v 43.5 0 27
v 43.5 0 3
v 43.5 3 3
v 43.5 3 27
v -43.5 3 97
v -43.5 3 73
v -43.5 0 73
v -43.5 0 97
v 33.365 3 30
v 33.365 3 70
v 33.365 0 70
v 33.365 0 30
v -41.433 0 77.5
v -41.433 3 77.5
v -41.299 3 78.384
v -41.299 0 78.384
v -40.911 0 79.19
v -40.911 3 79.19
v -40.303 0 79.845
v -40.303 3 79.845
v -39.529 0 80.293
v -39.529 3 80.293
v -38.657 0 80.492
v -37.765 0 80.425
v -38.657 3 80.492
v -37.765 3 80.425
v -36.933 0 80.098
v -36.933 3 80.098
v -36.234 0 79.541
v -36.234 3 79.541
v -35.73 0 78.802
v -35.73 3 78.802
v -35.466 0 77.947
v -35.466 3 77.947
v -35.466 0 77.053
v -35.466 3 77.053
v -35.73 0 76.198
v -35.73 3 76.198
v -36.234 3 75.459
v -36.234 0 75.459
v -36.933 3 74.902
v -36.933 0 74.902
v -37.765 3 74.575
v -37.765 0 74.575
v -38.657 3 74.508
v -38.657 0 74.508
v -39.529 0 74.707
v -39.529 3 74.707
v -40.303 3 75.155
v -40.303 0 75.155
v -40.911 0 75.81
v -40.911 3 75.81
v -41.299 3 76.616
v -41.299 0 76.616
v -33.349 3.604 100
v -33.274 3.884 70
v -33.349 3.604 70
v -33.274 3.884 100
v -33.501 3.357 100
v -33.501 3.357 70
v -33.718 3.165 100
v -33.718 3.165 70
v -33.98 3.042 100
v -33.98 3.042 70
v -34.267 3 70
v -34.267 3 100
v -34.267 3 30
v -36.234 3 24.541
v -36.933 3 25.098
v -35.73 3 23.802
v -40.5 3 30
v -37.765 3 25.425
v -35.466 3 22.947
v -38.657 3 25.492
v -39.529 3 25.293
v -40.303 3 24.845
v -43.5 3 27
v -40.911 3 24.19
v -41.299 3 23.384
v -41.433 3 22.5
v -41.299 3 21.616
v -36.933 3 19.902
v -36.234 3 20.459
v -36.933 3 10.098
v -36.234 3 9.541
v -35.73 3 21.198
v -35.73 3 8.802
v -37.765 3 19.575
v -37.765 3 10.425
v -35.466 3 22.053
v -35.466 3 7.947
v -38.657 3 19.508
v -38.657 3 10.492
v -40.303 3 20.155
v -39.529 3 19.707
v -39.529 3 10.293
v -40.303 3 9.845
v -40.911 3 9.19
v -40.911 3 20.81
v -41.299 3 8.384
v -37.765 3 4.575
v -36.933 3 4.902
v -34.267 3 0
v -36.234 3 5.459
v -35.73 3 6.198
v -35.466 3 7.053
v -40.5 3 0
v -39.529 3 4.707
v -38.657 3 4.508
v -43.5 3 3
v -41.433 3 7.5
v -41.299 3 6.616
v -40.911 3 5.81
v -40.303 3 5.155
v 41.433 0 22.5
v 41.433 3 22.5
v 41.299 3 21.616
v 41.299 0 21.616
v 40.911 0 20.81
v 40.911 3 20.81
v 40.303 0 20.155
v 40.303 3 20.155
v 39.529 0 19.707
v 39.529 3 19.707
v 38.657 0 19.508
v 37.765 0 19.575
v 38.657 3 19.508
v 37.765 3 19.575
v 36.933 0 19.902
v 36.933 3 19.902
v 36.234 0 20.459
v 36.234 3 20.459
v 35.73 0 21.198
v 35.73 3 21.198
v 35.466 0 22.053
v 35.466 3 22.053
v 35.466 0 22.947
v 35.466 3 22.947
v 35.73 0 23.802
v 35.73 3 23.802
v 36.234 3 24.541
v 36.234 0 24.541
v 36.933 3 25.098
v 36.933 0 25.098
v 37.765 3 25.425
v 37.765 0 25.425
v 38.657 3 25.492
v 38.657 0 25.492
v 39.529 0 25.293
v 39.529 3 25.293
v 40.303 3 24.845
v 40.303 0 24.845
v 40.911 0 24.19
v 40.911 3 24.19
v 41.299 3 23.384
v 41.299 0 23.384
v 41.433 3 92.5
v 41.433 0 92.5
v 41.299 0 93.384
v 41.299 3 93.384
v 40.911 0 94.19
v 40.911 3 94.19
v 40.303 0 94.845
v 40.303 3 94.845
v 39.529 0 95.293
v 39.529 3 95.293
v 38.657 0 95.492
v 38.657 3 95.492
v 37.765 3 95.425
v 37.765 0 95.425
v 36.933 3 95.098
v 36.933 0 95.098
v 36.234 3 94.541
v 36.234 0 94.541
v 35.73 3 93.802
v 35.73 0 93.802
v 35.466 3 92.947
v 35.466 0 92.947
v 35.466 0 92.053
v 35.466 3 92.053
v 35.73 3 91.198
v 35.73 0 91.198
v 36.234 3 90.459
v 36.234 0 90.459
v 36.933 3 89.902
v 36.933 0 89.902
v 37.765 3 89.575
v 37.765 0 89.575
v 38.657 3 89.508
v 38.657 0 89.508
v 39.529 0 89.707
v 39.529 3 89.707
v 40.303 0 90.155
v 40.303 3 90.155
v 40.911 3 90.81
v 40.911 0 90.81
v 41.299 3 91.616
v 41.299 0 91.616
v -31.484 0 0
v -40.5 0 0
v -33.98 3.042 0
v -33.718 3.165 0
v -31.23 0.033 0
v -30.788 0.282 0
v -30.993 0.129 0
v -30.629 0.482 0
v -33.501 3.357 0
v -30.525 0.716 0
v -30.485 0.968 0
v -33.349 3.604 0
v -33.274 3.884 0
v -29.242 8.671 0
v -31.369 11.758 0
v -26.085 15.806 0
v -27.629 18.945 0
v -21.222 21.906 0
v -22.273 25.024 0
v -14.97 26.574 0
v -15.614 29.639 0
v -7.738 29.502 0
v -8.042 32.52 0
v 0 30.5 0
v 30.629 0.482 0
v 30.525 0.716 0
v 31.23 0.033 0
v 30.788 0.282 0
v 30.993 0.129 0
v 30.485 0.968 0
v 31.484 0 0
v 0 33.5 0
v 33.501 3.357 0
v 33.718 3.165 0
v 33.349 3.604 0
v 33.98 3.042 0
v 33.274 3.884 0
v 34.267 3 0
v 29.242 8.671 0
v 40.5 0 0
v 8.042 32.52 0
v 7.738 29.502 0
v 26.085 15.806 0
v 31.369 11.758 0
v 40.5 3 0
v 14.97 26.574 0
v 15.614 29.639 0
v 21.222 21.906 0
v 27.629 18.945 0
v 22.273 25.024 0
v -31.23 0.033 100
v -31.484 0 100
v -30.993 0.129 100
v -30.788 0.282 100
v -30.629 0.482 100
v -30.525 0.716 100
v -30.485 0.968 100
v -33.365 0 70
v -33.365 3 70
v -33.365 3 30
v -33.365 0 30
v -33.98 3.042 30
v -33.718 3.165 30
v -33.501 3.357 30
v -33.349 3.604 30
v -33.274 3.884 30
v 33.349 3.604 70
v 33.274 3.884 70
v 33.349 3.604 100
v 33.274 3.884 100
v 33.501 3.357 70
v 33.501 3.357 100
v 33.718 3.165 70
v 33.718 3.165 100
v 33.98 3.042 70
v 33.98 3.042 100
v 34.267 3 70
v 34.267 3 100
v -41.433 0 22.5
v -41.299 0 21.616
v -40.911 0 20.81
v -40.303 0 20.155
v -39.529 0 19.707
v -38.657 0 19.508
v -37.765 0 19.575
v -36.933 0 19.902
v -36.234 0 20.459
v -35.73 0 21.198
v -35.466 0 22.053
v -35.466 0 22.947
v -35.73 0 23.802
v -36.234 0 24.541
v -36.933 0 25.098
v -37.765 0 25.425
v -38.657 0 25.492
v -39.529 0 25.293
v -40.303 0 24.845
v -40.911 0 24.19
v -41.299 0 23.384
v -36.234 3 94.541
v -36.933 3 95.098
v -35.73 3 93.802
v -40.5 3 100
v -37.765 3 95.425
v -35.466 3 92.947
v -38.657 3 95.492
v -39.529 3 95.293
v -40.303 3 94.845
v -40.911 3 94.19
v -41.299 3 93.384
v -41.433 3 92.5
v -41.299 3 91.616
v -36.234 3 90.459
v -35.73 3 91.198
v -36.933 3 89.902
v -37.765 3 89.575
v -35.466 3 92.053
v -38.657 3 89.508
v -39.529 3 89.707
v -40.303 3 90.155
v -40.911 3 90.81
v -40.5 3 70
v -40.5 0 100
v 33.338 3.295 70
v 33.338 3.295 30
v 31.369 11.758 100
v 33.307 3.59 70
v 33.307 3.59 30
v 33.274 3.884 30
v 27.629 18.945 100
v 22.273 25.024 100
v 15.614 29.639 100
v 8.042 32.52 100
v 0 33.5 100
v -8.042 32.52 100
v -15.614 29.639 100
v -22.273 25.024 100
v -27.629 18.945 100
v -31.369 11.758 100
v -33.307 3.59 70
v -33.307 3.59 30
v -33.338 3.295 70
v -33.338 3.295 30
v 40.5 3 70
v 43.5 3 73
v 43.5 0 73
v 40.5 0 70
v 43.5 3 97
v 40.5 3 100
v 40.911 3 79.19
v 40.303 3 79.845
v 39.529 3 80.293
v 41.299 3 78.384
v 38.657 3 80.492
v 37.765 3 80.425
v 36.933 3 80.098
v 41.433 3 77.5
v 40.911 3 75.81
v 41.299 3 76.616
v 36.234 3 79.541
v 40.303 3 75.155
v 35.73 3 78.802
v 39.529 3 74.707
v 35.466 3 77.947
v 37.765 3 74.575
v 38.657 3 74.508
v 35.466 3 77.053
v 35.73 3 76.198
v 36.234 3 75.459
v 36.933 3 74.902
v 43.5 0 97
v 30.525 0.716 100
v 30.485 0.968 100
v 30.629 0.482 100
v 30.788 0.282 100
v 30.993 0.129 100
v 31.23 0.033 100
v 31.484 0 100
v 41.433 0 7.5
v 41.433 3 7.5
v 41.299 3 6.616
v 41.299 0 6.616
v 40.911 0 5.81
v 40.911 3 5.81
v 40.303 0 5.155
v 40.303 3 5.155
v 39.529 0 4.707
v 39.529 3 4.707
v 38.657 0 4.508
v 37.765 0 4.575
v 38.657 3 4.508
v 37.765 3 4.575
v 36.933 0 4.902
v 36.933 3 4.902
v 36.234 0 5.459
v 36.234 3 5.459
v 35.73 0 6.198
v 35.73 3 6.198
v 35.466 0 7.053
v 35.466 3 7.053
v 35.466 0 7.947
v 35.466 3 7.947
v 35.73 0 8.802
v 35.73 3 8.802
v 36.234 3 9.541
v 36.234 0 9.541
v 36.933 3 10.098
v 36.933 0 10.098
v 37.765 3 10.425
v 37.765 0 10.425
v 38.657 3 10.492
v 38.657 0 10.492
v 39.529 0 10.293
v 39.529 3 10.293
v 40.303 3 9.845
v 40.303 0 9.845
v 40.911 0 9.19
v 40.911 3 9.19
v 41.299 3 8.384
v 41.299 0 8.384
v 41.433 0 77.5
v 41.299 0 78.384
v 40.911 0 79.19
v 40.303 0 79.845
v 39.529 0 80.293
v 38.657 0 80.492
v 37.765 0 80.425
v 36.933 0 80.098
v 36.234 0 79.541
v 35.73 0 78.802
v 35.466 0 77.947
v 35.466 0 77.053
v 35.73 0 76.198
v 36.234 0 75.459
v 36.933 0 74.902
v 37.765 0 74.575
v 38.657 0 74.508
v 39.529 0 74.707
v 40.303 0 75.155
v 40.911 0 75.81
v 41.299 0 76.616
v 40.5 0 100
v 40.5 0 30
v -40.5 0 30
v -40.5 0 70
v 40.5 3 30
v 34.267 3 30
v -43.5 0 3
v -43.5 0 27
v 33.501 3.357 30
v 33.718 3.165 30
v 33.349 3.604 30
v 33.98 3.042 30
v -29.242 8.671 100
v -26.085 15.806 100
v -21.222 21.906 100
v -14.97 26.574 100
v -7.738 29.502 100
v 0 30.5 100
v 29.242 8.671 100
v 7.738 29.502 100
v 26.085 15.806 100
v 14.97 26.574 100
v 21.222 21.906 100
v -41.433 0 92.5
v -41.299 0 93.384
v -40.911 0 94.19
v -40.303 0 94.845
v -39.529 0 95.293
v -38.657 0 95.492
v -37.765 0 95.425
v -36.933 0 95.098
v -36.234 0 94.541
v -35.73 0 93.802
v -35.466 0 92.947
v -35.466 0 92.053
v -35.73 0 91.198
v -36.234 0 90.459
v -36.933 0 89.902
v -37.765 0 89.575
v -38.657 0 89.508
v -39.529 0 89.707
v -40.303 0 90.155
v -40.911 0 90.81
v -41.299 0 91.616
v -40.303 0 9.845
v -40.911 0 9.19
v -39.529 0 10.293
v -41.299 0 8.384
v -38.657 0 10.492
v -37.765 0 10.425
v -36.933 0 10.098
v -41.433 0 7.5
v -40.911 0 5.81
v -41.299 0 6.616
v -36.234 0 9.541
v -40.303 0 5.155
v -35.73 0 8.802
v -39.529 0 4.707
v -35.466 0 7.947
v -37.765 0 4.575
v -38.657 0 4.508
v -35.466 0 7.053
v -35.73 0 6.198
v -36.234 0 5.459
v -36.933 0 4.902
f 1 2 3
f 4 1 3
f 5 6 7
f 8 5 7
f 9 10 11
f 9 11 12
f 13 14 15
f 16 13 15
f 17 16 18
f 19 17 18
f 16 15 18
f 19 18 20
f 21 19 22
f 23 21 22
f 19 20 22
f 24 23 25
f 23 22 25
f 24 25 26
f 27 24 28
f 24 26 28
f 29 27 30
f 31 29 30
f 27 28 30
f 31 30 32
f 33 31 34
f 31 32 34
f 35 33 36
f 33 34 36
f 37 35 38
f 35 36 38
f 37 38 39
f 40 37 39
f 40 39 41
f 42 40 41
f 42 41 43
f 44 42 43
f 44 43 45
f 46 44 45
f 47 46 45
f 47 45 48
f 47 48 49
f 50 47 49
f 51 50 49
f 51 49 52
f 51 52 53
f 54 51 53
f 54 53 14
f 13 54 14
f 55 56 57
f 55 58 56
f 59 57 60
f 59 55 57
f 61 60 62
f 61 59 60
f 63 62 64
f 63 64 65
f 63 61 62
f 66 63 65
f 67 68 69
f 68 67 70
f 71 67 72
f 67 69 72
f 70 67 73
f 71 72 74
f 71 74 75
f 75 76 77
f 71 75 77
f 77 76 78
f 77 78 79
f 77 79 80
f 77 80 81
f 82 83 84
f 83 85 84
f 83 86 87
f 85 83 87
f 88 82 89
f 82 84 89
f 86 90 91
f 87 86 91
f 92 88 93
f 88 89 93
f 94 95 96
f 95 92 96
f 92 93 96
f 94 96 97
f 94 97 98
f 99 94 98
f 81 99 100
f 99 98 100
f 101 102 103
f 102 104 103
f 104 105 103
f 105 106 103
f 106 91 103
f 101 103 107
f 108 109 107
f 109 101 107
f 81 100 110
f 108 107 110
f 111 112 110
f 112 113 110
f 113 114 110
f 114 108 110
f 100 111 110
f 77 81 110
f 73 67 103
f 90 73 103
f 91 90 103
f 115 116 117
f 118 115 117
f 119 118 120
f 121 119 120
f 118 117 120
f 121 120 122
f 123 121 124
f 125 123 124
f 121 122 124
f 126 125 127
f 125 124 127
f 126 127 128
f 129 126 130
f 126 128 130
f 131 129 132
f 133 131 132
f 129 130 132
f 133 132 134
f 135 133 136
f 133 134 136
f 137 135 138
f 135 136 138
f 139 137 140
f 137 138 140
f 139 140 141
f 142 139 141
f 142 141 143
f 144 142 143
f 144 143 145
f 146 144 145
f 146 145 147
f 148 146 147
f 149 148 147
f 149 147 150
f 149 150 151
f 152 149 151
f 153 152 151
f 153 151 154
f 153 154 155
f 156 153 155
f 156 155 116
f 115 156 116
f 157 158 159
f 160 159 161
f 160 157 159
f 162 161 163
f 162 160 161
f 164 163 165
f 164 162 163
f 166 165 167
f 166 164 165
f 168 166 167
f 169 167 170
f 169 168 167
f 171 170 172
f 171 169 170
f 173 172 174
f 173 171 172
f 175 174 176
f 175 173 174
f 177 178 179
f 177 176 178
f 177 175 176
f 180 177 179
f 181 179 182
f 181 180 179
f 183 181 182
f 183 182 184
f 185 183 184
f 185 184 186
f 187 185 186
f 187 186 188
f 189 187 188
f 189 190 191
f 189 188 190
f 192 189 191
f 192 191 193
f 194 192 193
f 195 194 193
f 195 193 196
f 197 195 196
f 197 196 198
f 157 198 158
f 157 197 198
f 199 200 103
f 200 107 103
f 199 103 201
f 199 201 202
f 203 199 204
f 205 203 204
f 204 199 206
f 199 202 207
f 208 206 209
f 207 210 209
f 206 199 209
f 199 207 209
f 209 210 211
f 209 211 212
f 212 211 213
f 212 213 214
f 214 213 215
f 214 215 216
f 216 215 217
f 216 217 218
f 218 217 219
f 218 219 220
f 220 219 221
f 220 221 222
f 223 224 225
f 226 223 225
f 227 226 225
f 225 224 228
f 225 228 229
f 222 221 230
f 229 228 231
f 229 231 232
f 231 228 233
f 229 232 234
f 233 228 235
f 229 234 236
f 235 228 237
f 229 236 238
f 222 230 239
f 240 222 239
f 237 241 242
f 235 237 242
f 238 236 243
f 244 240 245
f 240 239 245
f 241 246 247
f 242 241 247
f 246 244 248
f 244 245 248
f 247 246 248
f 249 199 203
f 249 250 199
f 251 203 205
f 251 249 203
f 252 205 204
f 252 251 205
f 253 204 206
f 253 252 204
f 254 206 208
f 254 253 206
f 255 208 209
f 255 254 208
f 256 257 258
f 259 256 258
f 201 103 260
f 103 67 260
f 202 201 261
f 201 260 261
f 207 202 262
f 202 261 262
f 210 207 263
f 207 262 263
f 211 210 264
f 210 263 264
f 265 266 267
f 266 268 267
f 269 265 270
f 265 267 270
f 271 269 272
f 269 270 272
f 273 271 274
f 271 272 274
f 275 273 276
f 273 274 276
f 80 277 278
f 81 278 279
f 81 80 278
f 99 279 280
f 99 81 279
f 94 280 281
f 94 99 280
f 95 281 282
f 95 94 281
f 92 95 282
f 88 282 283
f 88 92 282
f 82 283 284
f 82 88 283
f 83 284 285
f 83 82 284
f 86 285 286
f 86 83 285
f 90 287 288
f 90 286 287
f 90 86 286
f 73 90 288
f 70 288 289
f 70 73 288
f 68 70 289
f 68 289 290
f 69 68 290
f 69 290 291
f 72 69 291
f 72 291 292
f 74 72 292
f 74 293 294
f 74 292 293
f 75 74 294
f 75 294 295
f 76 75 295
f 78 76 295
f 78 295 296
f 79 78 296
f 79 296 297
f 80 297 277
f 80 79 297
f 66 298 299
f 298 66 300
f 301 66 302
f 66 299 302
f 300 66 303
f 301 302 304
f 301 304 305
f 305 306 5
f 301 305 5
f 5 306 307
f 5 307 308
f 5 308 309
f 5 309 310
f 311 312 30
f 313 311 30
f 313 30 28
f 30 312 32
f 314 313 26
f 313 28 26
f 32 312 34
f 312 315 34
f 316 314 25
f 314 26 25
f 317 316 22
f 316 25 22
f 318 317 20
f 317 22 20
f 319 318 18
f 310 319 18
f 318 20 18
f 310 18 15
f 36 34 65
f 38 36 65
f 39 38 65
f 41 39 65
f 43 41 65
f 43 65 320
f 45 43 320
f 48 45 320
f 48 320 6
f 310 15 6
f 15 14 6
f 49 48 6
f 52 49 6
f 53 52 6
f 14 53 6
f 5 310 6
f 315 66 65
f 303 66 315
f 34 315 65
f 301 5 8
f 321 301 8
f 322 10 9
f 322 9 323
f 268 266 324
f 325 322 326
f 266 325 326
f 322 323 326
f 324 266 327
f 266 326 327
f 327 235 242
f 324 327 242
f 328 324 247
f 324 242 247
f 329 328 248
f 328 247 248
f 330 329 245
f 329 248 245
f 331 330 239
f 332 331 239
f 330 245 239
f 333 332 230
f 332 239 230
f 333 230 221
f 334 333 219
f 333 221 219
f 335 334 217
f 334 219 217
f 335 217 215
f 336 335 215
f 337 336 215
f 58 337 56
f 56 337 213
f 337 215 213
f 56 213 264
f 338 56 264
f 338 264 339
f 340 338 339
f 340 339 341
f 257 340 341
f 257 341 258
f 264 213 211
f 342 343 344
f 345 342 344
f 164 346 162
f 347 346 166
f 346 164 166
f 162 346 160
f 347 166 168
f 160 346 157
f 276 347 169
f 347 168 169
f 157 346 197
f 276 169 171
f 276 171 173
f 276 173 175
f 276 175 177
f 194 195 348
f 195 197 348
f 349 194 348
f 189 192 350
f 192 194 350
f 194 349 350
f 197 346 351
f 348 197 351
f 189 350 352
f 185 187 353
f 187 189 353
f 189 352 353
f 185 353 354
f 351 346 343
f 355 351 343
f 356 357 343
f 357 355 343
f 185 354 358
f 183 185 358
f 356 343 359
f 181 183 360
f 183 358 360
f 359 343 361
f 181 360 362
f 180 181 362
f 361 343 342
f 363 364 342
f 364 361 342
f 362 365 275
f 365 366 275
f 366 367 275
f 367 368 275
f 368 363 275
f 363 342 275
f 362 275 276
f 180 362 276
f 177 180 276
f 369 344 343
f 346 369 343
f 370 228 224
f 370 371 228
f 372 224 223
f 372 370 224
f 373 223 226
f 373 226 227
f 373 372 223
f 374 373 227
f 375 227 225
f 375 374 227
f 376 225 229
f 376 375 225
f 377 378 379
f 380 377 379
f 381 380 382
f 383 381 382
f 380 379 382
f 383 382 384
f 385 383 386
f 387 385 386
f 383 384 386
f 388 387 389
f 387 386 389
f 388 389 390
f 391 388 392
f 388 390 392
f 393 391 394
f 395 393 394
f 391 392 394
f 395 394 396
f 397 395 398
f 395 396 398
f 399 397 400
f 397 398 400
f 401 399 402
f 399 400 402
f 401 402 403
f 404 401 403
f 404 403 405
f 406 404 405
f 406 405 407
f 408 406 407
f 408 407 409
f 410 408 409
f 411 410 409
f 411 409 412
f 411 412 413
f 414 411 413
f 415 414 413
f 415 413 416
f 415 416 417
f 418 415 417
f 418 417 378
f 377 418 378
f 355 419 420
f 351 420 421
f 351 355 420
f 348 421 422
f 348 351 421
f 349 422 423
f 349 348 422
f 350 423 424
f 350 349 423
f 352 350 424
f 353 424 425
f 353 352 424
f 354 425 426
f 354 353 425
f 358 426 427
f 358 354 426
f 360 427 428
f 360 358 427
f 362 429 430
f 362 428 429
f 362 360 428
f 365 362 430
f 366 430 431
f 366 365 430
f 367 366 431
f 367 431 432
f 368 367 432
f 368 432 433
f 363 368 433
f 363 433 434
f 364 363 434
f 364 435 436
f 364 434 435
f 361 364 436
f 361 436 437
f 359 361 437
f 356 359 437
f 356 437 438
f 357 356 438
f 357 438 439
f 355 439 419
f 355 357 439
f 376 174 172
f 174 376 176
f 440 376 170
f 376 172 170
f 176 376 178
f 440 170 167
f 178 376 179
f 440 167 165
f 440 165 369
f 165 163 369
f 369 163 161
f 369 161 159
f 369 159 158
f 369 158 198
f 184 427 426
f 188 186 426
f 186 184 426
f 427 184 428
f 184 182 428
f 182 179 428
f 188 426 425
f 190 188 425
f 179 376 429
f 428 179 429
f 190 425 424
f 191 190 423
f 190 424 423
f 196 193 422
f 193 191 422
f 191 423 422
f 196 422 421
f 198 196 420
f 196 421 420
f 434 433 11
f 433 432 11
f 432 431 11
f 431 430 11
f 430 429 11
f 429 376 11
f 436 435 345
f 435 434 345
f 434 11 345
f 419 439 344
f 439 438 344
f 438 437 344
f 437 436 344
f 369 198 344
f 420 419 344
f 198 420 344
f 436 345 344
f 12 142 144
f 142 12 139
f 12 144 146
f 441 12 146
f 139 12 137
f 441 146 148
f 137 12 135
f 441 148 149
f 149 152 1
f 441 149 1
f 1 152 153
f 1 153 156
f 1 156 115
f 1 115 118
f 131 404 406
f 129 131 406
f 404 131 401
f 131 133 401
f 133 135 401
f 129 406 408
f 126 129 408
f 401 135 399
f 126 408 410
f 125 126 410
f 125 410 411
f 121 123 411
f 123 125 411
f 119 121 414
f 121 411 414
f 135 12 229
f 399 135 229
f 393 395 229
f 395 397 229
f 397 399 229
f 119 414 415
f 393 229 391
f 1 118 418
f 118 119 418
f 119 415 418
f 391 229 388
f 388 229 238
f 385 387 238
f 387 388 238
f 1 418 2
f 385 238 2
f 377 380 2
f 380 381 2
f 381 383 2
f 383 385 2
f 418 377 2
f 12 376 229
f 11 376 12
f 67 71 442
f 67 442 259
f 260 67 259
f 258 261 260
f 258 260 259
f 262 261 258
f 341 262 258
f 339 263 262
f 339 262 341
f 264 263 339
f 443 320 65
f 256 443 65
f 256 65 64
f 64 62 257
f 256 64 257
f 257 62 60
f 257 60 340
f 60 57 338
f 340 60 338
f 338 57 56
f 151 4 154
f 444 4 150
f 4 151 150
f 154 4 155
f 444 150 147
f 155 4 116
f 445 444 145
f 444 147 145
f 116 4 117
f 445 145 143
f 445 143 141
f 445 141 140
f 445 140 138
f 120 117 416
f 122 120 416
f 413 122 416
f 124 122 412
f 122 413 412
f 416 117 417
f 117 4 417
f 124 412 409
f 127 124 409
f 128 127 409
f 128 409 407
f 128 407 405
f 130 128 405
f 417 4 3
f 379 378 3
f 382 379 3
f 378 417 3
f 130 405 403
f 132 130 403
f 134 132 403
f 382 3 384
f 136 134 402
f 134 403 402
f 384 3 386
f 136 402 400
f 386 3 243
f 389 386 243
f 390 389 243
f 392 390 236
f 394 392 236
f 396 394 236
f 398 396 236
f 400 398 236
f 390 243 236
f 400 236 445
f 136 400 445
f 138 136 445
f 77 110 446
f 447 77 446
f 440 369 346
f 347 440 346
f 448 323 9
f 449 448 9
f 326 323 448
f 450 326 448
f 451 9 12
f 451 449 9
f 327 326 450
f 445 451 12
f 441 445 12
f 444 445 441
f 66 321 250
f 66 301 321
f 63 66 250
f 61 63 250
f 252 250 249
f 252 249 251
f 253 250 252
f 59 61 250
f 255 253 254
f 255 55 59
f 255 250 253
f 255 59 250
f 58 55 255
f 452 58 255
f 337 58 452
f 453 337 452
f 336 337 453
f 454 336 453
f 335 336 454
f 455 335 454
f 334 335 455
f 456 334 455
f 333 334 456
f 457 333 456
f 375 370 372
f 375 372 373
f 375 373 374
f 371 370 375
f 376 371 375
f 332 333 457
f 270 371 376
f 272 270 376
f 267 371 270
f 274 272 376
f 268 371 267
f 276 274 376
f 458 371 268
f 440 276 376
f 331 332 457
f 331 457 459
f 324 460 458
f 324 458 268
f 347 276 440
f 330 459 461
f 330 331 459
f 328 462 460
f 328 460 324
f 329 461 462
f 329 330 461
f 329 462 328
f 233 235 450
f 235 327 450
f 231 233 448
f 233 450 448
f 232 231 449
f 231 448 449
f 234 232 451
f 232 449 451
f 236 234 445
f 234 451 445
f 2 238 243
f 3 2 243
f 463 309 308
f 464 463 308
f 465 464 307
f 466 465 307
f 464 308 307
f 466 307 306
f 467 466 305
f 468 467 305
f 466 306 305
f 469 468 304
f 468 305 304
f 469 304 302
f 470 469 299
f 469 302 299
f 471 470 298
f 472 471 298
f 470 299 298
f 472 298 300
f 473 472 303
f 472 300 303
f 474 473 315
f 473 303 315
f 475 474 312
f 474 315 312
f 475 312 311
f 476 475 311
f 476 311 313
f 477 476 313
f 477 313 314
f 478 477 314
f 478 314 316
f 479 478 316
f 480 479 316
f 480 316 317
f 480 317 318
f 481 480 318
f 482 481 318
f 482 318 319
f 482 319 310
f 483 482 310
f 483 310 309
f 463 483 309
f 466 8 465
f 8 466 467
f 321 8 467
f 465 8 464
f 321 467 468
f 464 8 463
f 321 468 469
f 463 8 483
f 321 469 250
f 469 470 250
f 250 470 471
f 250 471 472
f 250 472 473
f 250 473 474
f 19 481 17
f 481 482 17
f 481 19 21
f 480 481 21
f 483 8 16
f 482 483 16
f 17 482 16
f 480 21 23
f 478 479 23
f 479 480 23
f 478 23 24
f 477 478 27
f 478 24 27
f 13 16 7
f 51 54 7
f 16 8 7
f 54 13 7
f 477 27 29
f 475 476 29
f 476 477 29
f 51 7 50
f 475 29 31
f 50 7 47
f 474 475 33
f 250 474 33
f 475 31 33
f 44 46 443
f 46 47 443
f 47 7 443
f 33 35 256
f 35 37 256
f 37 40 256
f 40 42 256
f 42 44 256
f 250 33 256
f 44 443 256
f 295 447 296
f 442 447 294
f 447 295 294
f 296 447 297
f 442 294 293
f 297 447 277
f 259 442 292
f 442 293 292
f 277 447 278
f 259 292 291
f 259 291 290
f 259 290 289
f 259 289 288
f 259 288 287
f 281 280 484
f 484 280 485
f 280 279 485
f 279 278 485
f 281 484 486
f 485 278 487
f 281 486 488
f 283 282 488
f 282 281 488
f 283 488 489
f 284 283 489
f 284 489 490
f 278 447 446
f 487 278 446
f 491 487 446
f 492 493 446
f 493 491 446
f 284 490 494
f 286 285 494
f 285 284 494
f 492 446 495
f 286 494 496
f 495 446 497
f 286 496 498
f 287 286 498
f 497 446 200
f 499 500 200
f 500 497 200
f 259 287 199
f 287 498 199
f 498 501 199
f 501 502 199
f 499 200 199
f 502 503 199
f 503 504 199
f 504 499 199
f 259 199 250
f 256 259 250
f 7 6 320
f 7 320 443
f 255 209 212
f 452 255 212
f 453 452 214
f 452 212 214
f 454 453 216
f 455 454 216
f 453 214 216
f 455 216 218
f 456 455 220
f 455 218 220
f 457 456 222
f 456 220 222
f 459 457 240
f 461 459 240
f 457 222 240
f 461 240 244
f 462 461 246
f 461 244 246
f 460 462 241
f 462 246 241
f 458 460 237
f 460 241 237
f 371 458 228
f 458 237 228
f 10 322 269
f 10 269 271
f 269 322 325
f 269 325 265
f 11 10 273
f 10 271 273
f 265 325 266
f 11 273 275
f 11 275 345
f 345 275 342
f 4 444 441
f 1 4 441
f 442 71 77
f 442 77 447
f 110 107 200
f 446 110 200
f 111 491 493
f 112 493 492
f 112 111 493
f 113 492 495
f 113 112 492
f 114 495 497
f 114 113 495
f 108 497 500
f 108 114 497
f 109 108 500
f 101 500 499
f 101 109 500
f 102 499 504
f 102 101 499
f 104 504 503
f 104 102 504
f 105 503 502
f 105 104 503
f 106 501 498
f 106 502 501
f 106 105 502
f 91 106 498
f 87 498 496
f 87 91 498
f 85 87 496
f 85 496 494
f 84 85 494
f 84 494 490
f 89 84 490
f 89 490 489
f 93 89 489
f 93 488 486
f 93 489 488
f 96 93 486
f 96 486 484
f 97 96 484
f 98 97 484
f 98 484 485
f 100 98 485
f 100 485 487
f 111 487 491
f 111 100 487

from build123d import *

# Parameters (mm, degrees)
BOSS_EXTRUDE1_DEPTH     = 100
SKETCH3_W               = 10.134598759
SKETCH3_H               = 40
CUT_EXTRUDE1_DEPTH      = 60
SKETCH4_R               = 3
CUT_EXTRUDE2_DEPTH      = 60
MIRROR4_COPY_1_SKETCH_R = 3
MIRROR4_COPY_1_DEPTH    = 60
CHAMFER1_SIZE           = 3
FILLET1_R               = 1


with BuildPart() as part:
    # Sketch1 → Boss-Extrude1 (new body)
    with BuildSketch(Plane.XY):
        with BuildLine():
            Line((-43.5, 0), (-33.5, 0))
            ThreePointArc((-33.5, 0), (-33.466333393, 1.501508976), (-33.365401241, 3))
            Line((-33.365401241, 3), (-43.5, 3))
            Line((-43.5, 3), (-43.5, 0))
        make_face()
        with BuildLine():
            Line((-33.5, 0), (-30.5, 0))
            ThreePointArc((-30.5, 0), (0, 30.5), (30.5, 0))
            Line((30.5, 0), (33.5, 0))
            ThreePointArc((33.5, 0), (33.466333393, 1.501508976), (33.365401241, 3))
            ThreePointArc((33.365401241, 3), (0, 33.5), (-33.365401241, 3))
            ThreePointArc((-33.365401241, 3), (-33.466333393, 1.501508976), (-33.5, 0))
        make_face()
        with BuildLine():
            ThreePointArc((33.365401241, 3), (33.466333393, 1.501508976), (33.5, 0))
            Line((33.5, 0), (43.5, 0))
            Line((43.5, 0), (43.5, 3))
            Line((43.5, 3), (33.365401241, 3))
        make_face()
    extrude(amount=BOSS_EXTRUDE1_DEPTH)

    # Sketch3 → Cut-Extrude1 (cut)
    with BuildSketch(Plane(origin=(0, 3, 0), x_dir=(1, 0, 0), z_dir=(0, 1, 0))):
        with Locations((38.432700621, -50)):
            Rectangle(SKETCH3_W, SKETCH3_H)
        with Locations((-38.432700621, -50)):
            Rectangle(SKETCH3_W, SKETCH3_H)
    extrude(amount=-CUT_EXTRUDE1_DEPTH, mode=Mode.SUBTRACT)

    # Sketch4 → Cut-Extrude2 (cut)
    with BuildSketch(Plane(origin=(0, 3, 0), x_dir=(1, 0, 0), z_dir=(0, 1, 0))):
        with Locations((38.432700621, -22.5)):
            Circle(SKETCH4_R)
        with Locations((38.432700621, -7.5)):
            Circle(SKETCH4_R)
    cut_extrude2 = extrude(amount=-CUT_EXTRUDE2_DEPTH, mode=Mode.SUBTRACT)

    # Mirror3: Cut-Extrude2 across plane
    add(cut_extrude2.mirror(Plane(origin=(0, 0, 50), x_dir=(1, 0, 0), z_dir=(0, 0, -1))), mode=Mode.SUBTRACT)

    # Mirror4: Cut-Extrude2 across plane
    add(cut_extrude2.mirror(Plane(origin=(0, 0, 0), x_dir=(0, 0, 1), z_dir=(1, 0, 0))), mode=Mode.SUBTRACT)

    # Mirror4 copy 1 sketch → Mirror4 copy 1 (cut)
    with BuildSketch(Plane(origin=(0, 3, 100), x_dir=(-1, 0, 0), z_dir=(0, 1, 0))):
        with Locations((38.432700621, -22.5)):
            Circle(MIRROR4_COPY_1_SKETCH_R)
        with Locations((38.432700621, -7.5)):
            Circle(MIRROR4_COPY_1_SKETCH_R)
    extrude(amount=-MIRROR4_COPY_1_DEPTH, mode=Mode.SUBTRACT)

    # Chamfer1
    chamfer1_edges = [part.edges().sort_by_distance(p)[0] for p in [
        (-43.5, 1.5, 0),
        (43.5, 1.5, 0),
        (43.5, 1.5, 100),
        (-43.5, 1.5, 70),
        (-43.5, 1.5, 30),
        (43.5, 1.5, 30),
        (43.5, 1.5, 70),
        (-43.5, 1.5, 100),
    ]]
    chamfer(chamfer1_edges, length=CHAMFER1_SIZE)

    # Fillet1
    fillet1_edges = [part.edges().sort_by_distance(p)[0] for p in [
        (-33.365401241, 3, 85),
        (33.365401241, 3, 85),
        (30.5, 0, 50),
        (-30.5, 0, 50),
        (-33.365401241, 3, 15),
        (33.365401241, 3, 15),
    ]]
    fillet(fillet1_edges, radius=FILLET1_R)


solid = part.part
